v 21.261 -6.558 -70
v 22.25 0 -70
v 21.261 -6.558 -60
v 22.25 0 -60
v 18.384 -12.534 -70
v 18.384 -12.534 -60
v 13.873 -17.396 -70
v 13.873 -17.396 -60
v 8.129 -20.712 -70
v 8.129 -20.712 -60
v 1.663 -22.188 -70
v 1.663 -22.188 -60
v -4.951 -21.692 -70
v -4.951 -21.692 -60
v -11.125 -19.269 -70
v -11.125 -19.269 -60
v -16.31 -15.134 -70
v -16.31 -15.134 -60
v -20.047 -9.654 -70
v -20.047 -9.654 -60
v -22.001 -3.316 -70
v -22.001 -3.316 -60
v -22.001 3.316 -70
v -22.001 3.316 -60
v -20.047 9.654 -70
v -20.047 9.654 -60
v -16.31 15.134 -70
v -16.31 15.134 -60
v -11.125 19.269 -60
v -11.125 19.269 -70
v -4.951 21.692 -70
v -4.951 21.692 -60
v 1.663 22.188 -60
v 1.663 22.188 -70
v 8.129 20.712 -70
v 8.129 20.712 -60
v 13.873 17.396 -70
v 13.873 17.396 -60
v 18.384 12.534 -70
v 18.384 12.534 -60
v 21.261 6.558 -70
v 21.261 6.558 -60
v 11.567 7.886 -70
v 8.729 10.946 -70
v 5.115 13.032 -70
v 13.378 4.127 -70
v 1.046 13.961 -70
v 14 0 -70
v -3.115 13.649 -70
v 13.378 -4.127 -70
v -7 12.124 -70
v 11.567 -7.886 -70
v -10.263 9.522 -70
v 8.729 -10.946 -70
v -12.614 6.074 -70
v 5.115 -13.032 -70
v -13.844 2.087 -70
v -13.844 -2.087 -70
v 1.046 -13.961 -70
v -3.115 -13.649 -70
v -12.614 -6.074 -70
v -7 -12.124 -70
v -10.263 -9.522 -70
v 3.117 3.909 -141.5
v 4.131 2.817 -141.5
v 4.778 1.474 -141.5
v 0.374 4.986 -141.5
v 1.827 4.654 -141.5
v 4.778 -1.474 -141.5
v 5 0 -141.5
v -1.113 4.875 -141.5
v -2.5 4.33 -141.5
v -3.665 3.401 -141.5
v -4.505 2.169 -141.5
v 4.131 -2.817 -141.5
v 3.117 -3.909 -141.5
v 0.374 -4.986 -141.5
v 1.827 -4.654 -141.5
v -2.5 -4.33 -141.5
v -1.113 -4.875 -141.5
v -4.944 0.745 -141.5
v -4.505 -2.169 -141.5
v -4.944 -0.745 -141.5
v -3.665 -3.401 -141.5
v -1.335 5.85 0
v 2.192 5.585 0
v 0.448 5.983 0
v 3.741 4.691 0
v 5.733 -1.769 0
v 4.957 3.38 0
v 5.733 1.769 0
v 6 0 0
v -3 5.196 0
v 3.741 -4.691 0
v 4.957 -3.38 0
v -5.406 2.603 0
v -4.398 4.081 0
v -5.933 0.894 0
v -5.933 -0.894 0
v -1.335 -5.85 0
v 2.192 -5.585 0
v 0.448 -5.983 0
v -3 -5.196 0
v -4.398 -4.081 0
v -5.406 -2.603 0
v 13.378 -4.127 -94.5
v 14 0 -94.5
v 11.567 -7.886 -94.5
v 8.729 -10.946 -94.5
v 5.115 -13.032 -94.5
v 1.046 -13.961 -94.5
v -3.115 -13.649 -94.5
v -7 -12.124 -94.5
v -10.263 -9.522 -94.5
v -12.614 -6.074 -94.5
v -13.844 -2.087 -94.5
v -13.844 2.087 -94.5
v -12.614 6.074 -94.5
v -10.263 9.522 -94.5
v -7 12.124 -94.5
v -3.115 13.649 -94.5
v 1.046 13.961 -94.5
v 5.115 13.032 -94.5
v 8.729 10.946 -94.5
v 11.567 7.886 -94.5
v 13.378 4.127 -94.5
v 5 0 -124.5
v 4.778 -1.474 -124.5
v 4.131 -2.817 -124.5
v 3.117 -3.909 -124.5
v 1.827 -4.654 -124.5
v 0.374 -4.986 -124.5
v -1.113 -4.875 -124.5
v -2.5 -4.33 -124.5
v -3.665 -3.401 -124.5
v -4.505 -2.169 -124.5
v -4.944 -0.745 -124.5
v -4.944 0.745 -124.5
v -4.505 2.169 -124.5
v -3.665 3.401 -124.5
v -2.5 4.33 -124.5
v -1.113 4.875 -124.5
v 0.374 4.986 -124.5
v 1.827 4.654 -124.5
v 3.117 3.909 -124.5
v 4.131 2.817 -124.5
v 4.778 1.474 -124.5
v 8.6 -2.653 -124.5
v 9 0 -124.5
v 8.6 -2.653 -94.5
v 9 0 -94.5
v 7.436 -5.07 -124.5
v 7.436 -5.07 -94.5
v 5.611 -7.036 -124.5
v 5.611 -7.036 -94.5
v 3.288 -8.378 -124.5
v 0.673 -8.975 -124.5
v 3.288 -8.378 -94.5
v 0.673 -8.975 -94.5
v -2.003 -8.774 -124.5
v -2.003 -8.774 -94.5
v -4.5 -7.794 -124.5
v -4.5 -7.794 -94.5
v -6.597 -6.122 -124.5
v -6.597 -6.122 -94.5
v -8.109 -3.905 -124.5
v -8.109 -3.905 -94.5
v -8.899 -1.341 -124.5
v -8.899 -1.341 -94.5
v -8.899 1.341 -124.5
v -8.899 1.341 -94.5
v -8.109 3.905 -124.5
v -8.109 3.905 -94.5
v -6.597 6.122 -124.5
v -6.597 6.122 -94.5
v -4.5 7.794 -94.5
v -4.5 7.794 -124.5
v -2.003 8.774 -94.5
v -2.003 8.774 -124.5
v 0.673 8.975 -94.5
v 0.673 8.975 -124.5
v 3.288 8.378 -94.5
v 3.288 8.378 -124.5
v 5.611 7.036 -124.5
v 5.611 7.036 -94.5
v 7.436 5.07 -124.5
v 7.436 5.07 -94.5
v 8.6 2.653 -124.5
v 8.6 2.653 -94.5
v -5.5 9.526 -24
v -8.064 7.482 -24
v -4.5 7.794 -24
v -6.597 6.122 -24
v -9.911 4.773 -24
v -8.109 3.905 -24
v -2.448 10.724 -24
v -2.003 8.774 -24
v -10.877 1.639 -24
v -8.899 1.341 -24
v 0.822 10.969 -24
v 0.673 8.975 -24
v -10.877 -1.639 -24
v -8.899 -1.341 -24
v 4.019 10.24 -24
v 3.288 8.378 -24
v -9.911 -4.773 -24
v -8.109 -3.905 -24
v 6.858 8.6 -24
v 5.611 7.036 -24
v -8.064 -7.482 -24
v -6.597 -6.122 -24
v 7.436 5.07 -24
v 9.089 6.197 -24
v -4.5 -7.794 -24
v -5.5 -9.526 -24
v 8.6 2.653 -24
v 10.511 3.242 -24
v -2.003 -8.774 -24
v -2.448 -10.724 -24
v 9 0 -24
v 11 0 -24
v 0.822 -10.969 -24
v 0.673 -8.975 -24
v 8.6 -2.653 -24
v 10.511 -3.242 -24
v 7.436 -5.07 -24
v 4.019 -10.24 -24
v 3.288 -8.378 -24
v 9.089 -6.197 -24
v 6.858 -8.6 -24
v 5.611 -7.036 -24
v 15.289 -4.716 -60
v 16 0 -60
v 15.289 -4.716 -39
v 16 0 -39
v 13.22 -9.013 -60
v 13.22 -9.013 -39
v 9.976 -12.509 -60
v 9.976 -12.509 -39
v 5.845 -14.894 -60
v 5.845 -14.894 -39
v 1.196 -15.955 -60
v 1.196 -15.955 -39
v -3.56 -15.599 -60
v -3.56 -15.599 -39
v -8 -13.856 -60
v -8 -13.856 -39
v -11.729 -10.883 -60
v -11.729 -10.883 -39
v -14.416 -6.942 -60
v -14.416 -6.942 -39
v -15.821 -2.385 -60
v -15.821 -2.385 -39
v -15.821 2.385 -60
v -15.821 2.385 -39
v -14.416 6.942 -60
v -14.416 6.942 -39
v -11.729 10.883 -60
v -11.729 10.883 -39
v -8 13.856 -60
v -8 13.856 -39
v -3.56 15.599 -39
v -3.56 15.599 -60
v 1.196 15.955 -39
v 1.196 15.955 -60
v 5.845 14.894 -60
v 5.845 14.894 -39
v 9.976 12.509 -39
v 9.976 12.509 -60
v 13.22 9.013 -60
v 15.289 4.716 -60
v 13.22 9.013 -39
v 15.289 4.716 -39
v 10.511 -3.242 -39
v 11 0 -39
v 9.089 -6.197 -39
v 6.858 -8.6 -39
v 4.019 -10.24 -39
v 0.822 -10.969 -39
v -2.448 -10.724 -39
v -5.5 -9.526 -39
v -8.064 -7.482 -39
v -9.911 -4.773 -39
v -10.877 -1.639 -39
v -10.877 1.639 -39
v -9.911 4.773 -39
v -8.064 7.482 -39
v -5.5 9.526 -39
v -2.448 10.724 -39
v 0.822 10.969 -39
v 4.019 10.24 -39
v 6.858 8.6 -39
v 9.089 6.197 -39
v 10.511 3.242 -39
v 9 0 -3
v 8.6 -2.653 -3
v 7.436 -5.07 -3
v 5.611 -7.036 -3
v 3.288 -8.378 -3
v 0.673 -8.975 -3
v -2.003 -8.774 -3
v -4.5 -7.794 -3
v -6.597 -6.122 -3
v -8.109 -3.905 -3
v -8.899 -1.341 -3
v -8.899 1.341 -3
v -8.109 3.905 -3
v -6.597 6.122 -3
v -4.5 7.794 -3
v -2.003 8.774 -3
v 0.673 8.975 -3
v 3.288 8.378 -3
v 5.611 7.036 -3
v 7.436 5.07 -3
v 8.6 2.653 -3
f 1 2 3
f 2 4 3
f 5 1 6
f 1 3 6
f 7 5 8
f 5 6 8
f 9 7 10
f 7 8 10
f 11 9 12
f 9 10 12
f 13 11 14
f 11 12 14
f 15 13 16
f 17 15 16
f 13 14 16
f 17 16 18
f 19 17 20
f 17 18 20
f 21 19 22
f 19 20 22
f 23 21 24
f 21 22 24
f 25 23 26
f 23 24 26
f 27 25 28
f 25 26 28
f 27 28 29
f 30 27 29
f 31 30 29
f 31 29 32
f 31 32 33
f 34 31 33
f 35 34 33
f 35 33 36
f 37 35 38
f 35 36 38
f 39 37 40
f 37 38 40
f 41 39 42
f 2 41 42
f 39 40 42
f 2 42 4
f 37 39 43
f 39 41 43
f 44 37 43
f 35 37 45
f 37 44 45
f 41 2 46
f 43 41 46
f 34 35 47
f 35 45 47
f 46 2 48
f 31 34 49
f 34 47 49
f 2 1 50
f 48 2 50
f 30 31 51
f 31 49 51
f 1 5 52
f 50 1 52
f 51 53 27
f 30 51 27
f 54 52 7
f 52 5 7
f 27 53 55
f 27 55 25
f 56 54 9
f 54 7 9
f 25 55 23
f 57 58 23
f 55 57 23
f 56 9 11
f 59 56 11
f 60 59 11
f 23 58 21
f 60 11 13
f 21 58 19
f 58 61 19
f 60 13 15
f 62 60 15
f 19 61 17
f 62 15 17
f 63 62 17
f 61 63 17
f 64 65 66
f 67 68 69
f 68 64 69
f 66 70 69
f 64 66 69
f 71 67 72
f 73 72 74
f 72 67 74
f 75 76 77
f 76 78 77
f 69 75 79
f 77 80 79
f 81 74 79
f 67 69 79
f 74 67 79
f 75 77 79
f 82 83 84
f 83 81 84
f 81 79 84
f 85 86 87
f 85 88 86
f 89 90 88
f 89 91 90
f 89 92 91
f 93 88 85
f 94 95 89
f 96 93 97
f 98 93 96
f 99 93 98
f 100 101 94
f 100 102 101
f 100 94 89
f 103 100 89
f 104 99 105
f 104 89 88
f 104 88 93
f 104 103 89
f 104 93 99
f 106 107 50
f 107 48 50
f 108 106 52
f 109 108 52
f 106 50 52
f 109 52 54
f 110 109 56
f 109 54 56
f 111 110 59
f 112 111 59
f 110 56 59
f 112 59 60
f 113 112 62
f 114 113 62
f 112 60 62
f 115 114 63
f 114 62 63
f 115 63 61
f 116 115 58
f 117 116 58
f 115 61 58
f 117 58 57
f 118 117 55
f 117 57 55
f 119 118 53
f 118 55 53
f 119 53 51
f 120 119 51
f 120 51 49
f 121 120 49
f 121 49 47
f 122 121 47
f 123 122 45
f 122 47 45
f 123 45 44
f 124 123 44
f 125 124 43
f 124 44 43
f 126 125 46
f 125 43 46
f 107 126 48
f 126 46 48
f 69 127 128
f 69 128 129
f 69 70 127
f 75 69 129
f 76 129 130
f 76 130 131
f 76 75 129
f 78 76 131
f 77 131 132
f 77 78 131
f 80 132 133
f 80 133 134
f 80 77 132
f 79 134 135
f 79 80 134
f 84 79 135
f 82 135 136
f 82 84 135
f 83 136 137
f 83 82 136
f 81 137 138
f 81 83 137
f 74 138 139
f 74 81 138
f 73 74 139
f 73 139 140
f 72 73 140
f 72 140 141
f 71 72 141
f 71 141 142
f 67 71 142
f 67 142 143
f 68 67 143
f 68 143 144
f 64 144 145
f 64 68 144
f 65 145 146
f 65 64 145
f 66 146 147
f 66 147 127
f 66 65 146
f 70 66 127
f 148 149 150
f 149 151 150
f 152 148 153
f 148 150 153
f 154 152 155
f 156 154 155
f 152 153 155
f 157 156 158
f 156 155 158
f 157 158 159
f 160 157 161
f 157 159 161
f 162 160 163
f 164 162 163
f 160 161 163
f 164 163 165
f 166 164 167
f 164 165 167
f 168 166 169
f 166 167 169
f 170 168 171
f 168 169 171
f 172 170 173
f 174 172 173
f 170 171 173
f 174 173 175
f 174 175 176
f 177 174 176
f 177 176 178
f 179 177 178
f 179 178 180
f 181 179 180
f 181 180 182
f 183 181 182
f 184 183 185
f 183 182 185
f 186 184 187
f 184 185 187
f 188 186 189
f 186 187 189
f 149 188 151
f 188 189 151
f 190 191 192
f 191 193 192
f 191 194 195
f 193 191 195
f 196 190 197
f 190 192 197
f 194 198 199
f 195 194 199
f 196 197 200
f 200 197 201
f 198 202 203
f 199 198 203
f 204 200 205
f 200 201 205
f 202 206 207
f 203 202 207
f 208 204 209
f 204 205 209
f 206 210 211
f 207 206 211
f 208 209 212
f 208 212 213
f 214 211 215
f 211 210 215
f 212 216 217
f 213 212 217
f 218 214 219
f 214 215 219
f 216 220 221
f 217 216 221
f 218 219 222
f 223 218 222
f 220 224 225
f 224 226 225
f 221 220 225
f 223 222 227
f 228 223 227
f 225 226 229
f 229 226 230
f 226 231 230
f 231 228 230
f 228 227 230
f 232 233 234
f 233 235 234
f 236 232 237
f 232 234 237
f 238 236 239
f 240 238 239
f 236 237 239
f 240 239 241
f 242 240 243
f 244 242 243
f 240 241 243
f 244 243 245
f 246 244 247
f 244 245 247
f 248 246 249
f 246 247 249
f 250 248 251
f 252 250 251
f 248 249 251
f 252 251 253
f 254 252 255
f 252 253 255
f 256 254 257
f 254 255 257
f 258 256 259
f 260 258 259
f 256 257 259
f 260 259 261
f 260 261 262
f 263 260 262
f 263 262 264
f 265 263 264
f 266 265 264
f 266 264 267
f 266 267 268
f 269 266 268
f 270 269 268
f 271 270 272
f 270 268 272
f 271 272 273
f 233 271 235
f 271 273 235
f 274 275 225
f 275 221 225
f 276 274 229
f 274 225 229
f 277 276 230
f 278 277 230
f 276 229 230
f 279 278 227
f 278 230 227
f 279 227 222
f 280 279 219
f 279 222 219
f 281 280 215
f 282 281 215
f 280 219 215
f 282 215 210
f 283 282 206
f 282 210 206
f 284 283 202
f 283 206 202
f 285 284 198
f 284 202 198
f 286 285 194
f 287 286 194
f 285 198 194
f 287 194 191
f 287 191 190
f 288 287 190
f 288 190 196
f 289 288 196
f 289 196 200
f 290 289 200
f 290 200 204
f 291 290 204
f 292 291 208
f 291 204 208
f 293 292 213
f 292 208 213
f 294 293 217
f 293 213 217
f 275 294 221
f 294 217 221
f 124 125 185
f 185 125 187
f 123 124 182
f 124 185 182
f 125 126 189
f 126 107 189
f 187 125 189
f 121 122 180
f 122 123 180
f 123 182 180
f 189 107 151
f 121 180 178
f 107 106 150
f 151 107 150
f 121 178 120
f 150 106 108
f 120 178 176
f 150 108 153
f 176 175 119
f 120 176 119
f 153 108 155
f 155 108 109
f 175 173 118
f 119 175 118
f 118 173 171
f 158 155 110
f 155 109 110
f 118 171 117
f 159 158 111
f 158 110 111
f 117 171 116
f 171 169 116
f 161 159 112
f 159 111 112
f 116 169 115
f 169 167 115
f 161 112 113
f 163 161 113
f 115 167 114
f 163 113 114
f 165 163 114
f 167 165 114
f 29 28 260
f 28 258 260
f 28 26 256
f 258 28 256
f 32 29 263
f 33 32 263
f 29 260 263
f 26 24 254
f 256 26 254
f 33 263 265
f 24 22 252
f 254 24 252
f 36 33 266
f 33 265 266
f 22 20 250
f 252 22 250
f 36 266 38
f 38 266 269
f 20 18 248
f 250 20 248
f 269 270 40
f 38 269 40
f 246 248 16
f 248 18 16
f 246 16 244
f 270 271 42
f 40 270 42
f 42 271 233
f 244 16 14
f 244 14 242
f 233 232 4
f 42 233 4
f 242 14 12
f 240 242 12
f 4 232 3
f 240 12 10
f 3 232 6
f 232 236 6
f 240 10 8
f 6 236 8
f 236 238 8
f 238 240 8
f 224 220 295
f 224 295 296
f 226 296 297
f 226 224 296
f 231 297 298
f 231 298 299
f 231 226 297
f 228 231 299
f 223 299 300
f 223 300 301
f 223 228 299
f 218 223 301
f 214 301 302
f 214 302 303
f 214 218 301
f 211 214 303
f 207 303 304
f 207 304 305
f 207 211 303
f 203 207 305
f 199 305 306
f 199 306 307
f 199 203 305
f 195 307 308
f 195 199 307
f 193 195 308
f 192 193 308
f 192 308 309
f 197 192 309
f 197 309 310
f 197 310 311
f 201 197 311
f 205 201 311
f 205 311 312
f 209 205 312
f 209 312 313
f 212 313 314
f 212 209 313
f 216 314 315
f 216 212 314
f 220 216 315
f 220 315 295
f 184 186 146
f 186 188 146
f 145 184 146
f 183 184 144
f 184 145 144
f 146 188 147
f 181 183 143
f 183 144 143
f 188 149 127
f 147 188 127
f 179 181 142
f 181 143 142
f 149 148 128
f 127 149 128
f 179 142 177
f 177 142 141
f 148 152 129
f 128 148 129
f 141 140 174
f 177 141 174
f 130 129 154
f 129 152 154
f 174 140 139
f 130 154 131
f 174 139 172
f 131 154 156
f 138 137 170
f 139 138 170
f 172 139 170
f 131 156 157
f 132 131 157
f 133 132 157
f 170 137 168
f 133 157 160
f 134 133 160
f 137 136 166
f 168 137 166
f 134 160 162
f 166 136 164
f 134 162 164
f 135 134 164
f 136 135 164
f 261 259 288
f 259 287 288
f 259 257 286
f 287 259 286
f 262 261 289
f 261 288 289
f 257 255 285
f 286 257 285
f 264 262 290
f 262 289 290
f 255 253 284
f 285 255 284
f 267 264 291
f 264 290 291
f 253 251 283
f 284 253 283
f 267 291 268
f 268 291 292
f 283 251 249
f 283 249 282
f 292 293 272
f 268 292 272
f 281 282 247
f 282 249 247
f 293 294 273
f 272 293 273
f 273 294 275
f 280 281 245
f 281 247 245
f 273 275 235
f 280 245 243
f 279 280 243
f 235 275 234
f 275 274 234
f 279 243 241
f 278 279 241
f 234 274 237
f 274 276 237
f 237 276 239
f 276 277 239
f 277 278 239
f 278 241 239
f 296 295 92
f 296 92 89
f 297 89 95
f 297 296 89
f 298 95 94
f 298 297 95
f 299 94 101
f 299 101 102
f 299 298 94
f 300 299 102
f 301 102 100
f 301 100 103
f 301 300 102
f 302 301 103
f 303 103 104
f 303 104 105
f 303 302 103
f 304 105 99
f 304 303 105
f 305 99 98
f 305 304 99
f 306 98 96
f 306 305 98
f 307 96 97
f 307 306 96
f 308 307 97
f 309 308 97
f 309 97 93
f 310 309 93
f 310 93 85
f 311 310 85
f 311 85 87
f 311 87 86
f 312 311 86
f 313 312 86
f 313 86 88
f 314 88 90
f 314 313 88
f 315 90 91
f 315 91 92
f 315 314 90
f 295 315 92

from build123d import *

# Parameters (mm, degrees)
SKETCH1_W     = 24
SKETCH1_H     = 9
SKETCH1_W_2   = 17
SKETCH1_H_2   = 5
CHAMFER1_SIZE = 3


with BuildPart() as part:
    # Sketch1 → Revolve1 (revolve)
    with BuildSketch(Plane(origin=(0, 0, 0), x_dir=(0, 0, -1), z_dir=(1, 0, 0)), mode=Mode.PRIVATE) as revolve1_sk:
        with Locations((12, 4.5)):
            Rectangle(SKETCH1_W, SKETCH1_H)
        Polygon((24, 9), (24, 0), (39, 0), (39, 11), (24, 11), align=None)
        Polygon((39, 11), (39, 0), (60, 0), (60, 16), (39, 16), align=None)
        Polygon((60, 16), (60, 0), (70, 0), (70, 14), (70, 22.25), (60, 22.25), align=None)
        Polygon((70, 14), (70, 0), (94.5, 0), (94.5, 9), (94.5, 14), align=None)
        Polygon((94.5, 9), (94.5, 0), (124.5, 0), (124.5, 5), (124.5, 9), align=None)
        with Locations((133, 2.5)):
            Rectangle(SKETCH1_W_2, SKETCH1_H_2)
    revolve(revolve1_sk.sketch.rotate(Axis((0, 0, -60), (0, 0, -1)), 90), axis=Axis((0, 0, -60), (0, 0, -1)))

    # Chamfer1
    chamfer1_edges = [part.edges().sort_by_distance(p)[0] for p in [
        (-9, 0, 0),
    ]]
    chamfer(chamfer1_edges, length=CHAMFER1_SIZE)


solid = part.part
